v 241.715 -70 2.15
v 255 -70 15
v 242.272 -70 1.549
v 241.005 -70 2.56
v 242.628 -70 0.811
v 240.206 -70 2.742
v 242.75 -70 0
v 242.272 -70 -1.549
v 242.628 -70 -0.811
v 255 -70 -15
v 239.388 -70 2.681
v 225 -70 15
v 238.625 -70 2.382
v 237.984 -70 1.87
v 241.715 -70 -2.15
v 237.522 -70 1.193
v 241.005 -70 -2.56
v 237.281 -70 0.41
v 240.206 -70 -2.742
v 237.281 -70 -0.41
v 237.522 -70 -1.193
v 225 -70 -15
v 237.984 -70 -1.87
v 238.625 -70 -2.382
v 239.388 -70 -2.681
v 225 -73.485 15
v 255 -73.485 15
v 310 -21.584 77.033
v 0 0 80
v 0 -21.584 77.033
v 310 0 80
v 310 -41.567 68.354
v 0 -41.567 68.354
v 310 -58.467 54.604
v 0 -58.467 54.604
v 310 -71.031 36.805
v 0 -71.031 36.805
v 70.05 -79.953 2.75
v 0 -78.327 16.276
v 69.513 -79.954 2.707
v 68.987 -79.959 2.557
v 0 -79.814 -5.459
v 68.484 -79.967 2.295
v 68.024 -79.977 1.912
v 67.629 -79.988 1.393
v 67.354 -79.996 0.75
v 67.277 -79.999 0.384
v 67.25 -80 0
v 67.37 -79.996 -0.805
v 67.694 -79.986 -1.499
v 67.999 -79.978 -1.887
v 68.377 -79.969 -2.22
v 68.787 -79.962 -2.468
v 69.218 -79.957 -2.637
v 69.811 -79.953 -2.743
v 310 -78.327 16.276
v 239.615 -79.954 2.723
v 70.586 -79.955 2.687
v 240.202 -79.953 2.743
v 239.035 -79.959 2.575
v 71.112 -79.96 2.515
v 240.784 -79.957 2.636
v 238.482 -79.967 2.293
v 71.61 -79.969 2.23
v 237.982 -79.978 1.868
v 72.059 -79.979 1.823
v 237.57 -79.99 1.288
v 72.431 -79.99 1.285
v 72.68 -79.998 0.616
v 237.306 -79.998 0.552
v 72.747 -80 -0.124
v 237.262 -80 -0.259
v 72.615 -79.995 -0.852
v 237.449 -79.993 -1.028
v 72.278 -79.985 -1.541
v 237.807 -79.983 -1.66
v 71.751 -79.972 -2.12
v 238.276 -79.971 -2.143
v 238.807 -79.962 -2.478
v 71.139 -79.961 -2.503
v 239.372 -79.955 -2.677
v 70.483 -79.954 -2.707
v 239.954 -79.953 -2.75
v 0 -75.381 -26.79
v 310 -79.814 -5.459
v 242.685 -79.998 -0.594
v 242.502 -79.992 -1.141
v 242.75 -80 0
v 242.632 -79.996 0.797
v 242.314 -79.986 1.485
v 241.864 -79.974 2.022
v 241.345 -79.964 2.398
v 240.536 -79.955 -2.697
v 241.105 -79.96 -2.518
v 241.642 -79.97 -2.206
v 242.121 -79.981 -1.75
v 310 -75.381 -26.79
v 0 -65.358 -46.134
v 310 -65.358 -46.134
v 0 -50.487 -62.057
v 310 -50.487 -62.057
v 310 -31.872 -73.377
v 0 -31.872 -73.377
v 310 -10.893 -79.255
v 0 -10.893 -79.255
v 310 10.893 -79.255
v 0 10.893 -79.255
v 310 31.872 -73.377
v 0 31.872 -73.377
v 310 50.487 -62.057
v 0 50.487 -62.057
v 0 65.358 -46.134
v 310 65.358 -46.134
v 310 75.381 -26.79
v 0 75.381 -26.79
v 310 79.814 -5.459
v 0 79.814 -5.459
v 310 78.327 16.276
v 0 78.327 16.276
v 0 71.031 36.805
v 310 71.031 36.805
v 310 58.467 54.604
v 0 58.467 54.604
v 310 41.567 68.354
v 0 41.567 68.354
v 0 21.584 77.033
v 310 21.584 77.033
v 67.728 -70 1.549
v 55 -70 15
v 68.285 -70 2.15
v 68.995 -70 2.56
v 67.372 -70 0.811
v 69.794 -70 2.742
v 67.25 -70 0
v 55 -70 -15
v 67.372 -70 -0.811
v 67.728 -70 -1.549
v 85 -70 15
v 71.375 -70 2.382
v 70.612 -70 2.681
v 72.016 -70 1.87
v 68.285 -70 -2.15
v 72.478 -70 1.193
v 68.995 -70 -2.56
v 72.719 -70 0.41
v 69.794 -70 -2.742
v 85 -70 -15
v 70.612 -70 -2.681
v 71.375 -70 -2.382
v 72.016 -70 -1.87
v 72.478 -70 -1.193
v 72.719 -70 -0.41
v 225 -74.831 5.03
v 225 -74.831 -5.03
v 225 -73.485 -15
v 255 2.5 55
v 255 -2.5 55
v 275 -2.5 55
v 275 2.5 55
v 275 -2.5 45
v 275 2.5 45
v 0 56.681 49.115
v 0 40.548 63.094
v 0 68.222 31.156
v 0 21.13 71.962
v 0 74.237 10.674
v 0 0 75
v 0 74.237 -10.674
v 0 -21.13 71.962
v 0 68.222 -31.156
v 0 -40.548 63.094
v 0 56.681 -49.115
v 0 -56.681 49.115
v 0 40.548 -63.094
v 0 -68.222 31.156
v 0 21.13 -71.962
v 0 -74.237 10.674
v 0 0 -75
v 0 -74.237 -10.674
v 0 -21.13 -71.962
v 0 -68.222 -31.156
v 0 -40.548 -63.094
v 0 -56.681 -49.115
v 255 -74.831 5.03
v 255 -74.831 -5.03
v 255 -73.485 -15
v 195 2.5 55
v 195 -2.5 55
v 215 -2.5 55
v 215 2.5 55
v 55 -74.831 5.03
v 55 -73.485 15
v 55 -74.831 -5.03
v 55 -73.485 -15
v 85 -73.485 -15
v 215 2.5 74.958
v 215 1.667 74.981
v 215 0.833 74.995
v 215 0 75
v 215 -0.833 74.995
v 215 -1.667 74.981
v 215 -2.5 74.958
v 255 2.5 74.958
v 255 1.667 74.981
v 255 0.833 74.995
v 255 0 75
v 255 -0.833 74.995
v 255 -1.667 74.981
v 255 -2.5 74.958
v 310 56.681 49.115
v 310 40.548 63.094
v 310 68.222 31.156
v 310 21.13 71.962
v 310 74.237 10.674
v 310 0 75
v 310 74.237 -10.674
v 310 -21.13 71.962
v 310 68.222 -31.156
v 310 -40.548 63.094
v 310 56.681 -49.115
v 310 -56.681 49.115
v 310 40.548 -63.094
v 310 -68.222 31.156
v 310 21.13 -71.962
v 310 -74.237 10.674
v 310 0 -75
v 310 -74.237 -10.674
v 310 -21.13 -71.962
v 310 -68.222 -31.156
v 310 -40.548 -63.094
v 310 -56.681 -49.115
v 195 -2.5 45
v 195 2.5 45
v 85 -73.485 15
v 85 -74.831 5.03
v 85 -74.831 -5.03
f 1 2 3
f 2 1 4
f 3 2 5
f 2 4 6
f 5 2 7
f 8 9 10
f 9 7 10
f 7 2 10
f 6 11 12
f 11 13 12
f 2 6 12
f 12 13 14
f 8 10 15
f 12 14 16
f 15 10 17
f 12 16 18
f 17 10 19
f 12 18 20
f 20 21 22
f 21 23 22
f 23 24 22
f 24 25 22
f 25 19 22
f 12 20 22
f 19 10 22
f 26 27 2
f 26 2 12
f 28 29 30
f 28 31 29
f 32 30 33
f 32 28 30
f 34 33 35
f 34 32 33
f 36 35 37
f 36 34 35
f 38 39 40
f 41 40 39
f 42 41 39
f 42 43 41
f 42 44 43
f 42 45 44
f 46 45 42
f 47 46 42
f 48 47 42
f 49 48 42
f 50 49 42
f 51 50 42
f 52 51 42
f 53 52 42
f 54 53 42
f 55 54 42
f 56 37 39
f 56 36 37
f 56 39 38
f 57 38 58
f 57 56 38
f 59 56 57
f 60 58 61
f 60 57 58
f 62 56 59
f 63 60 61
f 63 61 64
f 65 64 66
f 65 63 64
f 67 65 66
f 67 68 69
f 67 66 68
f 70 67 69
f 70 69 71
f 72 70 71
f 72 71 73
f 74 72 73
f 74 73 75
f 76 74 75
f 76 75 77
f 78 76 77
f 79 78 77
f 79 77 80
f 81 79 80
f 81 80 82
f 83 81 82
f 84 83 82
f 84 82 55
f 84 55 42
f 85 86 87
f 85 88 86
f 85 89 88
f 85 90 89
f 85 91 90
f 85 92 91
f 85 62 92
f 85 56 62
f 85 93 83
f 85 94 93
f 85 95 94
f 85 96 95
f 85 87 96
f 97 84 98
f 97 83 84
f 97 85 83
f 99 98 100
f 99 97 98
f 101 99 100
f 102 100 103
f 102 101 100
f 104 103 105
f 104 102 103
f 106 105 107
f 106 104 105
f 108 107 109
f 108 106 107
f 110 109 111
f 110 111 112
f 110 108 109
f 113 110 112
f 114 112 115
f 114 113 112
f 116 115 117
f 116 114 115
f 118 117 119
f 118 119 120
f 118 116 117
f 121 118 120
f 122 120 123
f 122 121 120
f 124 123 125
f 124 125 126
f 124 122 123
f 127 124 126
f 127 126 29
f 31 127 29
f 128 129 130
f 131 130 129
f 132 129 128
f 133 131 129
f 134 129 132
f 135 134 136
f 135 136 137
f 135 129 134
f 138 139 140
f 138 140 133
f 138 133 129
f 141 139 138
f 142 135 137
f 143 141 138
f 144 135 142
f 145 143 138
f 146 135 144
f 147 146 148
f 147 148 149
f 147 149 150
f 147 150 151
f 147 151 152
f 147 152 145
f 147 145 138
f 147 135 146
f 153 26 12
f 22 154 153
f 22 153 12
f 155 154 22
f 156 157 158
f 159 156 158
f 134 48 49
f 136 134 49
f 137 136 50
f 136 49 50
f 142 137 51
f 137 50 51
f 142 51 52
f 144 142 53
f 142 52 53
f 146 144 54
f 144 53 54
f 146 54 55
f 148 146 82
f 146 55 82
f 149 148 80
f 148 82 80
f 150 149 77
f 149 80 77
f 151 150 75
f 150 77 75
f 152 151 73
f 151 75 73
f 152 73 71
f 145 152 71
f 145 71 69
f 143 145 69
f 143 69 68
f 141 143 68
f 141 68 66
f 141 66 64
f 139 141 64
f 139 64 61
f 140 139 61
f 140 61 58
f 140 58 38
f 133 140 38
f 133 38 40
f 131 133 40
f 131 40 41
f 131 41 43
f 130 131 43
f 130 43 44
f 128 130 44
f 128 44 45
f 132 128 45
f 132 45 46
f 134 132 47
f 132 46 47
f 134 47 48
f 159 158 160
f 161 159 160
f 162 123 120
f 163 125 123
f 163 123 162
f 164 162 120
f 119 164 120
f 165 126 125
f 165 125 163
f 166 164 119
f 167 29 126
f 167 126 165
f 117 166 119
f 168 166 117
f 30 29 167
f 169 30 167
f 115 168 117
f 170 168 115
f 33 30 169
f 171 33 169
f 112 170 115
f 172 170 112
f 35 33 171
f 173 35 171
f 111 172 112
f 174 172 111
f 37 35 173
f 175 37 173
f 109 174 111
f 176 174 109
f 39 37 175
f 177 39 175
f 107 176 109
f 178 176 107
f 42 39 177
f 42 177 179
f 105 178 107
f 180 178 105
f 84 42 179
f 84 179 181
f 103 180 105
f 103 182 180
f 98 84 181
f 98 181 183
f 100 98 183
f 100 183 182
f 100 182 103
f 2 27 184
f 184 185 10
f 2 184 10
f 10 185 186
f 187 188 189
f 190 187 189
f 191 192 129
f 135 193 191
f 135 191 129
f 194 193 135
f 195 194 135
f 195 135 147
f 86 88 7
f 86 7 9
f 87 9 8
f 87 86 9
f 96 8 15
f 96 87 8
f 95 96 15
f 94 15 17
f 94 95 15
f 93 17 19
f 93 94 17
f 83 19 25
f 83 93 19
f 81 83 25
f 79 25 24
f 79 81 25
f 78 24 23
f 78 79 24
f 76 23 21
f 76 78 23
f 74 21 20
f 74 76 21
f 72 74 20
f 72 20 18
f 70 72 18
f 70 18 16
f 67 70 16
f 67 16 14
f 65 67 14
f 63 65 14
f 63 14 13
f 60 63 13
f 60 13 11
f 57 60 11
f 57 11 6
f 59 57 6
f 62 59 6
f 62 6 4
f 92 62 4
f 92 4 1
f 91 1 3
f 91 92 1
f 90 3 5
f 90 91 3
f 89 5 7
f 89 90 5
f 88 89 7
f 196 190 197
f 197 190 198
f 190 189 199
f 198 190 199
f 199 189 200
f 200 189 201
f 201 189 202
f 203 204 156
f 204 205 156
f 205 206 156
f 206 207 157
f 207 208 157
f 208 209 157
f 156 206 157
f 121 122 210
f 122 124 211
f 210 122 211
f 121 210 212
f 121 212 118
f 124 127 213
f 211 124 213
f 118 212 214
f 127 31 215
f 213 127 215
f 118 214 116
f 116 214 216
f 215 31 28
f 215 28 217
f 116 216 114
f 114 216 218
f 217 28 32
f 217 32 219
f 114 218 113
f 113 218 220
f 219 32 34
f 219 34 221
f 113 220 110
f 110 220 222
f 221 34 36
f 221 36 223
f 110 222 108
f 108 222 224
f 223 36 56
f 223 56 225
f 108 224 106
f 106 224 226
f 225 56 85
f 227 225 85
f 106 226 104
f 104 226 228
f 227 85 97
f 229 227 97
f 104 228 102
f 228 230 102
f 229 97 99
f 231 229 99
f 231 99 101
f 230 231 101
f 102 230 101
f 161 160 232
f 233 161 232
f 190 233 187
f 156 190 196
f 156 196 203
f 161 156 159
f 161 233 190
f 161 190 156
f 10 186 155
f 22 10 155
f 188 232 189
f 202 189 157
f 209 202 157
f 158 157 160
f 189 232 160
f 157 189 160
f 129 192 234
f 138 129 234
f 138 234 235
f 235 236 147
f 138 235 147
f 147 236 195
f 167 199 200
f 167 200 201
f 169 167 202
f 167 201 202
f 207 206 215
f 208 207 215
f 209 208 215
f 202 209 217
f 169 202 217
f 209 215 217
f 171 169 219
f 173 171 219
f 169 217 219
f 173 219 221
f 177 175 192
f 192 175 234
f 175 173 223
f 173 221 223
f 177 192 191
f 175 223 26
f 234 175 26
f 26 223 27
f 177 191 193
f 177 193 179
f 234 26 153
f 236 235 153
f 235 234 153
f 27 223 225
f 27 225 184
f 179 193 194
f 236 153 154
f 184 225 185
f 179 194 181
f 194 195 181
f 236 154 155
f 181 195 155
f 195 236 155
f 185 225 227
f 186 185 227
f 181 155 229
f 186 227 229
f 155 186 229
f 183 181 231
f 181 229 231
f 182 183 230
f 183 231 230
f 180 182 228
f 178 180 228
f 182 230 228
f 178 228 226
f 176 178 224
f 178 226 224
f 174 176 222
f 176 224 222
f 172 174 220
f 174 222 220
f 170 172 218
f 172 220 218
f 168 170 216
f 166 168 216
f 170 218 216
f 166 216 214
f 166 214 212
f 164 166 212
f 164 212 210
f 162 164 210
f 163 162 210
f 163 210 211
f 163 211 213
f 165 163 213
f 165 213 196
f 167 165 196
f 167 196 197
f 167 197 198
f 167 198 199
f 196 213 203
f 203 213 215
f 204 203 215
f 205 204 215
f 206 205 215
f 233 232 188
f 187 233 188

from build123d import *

# Parameters (mm, degrees)
SKIZZE1_W                            = 310
SKIZZE1_H                            = 5
AUFSATZ_LINEAR_AUSTRAGEN1_DEPTH      = 2.5
AUFSATZ_LINEAR_AUSTRAGEN1_DEPTH_BACK = 2.5
SKIZZE5_W                            = 30
SKIZZE5_H                            = 30
AUFSATZ_LINEAR_AUSTRAGEN2_DEPTH      = 5
DURCHGANGSLOCH_F_R_M51_D             = 5.5
DURCHGANGSLOCH_F_R_M51_DEPTH         = 10


with BuildPart() as part:
    # Skizze1 → Rotation1 (revolve)
    with BuildSketch(Plane.XY, mode=Mode.PRIVATE) as rotation1_sk:
        with Locations((155, 77.5)):
            Rectangle(SKIZZE1_W, SKIZZE1_H)
    revolve(rotation1_sk.sketch.rotate(Axis((0, 0, 0), (1, 0, 0)), 90), axis=Axis((0, 0, 0), (1, 0, 0)))

    # Skizze3 → Aufsatz-Linear austragen1 (add, two sides: drawn at the far end of the back side and taken through both)
    with BuildSketch(Plane(origin=(0, 0, 0), x_dir=(1, 0, 0), z_dir=(0, 1, 0)).offset(-AUFSATZ_LINEAR_AUSTRAGEN1_DEPTH_BACK)):
        Polygon((255, -55), (275, -55), (275, -45), (195, -45), (195, -55), (215, -55), (215, -75), (255, -75), align=None)
    extrude(amount=AUFSATZ_LINEAR_AUSTRAGEN1_DEPTH + AUFSATZ_LINEAR_AUSTRAGEN1_DEPTH_BACK)

    # Skizze5 → Aufsatz-Linear austragen2 (add)
    with BuildSketch(Plane(origin=(0, -75, 0), x_dir=(1, 0, 0), z_dir=(0, 1, 0))):
        with Locations((70, 0)):
            Rectangle(SKIZZE5_W, SKIZZE5_H)
    aufsatz_linear_austragen2 = extrude(amount=AUFSATZ_LINEAR_AUSTRAGEN2_DEPTH)

    # Durchgangsloch für M51
    with Locations(Plane(origin=(0, -70, 0), x_dir=(1, 0, 0), z_dir=(0, 1, 0))):
        with Locations((70, 0)):
            durchgangsloch_f_r_m51 = Hole(DURCHGANGSLOCH_F_R_M51_D / 2, depth=DURCHGANGSLOCH_F_R_M51_DEPTH)

    # Spiegeln2: Aufsatz-Linear austragen2, Durchgangsloch für M51 across plane
    add(aufsatz_linear_austragen2.mirror(Plane.ZY.offset(-155)))
    add(durchgangsloch_f_r_m51.mirror(Plane.ZY.offset(-155)), mode=Mode.SUBTRACT)


solid = part.part
